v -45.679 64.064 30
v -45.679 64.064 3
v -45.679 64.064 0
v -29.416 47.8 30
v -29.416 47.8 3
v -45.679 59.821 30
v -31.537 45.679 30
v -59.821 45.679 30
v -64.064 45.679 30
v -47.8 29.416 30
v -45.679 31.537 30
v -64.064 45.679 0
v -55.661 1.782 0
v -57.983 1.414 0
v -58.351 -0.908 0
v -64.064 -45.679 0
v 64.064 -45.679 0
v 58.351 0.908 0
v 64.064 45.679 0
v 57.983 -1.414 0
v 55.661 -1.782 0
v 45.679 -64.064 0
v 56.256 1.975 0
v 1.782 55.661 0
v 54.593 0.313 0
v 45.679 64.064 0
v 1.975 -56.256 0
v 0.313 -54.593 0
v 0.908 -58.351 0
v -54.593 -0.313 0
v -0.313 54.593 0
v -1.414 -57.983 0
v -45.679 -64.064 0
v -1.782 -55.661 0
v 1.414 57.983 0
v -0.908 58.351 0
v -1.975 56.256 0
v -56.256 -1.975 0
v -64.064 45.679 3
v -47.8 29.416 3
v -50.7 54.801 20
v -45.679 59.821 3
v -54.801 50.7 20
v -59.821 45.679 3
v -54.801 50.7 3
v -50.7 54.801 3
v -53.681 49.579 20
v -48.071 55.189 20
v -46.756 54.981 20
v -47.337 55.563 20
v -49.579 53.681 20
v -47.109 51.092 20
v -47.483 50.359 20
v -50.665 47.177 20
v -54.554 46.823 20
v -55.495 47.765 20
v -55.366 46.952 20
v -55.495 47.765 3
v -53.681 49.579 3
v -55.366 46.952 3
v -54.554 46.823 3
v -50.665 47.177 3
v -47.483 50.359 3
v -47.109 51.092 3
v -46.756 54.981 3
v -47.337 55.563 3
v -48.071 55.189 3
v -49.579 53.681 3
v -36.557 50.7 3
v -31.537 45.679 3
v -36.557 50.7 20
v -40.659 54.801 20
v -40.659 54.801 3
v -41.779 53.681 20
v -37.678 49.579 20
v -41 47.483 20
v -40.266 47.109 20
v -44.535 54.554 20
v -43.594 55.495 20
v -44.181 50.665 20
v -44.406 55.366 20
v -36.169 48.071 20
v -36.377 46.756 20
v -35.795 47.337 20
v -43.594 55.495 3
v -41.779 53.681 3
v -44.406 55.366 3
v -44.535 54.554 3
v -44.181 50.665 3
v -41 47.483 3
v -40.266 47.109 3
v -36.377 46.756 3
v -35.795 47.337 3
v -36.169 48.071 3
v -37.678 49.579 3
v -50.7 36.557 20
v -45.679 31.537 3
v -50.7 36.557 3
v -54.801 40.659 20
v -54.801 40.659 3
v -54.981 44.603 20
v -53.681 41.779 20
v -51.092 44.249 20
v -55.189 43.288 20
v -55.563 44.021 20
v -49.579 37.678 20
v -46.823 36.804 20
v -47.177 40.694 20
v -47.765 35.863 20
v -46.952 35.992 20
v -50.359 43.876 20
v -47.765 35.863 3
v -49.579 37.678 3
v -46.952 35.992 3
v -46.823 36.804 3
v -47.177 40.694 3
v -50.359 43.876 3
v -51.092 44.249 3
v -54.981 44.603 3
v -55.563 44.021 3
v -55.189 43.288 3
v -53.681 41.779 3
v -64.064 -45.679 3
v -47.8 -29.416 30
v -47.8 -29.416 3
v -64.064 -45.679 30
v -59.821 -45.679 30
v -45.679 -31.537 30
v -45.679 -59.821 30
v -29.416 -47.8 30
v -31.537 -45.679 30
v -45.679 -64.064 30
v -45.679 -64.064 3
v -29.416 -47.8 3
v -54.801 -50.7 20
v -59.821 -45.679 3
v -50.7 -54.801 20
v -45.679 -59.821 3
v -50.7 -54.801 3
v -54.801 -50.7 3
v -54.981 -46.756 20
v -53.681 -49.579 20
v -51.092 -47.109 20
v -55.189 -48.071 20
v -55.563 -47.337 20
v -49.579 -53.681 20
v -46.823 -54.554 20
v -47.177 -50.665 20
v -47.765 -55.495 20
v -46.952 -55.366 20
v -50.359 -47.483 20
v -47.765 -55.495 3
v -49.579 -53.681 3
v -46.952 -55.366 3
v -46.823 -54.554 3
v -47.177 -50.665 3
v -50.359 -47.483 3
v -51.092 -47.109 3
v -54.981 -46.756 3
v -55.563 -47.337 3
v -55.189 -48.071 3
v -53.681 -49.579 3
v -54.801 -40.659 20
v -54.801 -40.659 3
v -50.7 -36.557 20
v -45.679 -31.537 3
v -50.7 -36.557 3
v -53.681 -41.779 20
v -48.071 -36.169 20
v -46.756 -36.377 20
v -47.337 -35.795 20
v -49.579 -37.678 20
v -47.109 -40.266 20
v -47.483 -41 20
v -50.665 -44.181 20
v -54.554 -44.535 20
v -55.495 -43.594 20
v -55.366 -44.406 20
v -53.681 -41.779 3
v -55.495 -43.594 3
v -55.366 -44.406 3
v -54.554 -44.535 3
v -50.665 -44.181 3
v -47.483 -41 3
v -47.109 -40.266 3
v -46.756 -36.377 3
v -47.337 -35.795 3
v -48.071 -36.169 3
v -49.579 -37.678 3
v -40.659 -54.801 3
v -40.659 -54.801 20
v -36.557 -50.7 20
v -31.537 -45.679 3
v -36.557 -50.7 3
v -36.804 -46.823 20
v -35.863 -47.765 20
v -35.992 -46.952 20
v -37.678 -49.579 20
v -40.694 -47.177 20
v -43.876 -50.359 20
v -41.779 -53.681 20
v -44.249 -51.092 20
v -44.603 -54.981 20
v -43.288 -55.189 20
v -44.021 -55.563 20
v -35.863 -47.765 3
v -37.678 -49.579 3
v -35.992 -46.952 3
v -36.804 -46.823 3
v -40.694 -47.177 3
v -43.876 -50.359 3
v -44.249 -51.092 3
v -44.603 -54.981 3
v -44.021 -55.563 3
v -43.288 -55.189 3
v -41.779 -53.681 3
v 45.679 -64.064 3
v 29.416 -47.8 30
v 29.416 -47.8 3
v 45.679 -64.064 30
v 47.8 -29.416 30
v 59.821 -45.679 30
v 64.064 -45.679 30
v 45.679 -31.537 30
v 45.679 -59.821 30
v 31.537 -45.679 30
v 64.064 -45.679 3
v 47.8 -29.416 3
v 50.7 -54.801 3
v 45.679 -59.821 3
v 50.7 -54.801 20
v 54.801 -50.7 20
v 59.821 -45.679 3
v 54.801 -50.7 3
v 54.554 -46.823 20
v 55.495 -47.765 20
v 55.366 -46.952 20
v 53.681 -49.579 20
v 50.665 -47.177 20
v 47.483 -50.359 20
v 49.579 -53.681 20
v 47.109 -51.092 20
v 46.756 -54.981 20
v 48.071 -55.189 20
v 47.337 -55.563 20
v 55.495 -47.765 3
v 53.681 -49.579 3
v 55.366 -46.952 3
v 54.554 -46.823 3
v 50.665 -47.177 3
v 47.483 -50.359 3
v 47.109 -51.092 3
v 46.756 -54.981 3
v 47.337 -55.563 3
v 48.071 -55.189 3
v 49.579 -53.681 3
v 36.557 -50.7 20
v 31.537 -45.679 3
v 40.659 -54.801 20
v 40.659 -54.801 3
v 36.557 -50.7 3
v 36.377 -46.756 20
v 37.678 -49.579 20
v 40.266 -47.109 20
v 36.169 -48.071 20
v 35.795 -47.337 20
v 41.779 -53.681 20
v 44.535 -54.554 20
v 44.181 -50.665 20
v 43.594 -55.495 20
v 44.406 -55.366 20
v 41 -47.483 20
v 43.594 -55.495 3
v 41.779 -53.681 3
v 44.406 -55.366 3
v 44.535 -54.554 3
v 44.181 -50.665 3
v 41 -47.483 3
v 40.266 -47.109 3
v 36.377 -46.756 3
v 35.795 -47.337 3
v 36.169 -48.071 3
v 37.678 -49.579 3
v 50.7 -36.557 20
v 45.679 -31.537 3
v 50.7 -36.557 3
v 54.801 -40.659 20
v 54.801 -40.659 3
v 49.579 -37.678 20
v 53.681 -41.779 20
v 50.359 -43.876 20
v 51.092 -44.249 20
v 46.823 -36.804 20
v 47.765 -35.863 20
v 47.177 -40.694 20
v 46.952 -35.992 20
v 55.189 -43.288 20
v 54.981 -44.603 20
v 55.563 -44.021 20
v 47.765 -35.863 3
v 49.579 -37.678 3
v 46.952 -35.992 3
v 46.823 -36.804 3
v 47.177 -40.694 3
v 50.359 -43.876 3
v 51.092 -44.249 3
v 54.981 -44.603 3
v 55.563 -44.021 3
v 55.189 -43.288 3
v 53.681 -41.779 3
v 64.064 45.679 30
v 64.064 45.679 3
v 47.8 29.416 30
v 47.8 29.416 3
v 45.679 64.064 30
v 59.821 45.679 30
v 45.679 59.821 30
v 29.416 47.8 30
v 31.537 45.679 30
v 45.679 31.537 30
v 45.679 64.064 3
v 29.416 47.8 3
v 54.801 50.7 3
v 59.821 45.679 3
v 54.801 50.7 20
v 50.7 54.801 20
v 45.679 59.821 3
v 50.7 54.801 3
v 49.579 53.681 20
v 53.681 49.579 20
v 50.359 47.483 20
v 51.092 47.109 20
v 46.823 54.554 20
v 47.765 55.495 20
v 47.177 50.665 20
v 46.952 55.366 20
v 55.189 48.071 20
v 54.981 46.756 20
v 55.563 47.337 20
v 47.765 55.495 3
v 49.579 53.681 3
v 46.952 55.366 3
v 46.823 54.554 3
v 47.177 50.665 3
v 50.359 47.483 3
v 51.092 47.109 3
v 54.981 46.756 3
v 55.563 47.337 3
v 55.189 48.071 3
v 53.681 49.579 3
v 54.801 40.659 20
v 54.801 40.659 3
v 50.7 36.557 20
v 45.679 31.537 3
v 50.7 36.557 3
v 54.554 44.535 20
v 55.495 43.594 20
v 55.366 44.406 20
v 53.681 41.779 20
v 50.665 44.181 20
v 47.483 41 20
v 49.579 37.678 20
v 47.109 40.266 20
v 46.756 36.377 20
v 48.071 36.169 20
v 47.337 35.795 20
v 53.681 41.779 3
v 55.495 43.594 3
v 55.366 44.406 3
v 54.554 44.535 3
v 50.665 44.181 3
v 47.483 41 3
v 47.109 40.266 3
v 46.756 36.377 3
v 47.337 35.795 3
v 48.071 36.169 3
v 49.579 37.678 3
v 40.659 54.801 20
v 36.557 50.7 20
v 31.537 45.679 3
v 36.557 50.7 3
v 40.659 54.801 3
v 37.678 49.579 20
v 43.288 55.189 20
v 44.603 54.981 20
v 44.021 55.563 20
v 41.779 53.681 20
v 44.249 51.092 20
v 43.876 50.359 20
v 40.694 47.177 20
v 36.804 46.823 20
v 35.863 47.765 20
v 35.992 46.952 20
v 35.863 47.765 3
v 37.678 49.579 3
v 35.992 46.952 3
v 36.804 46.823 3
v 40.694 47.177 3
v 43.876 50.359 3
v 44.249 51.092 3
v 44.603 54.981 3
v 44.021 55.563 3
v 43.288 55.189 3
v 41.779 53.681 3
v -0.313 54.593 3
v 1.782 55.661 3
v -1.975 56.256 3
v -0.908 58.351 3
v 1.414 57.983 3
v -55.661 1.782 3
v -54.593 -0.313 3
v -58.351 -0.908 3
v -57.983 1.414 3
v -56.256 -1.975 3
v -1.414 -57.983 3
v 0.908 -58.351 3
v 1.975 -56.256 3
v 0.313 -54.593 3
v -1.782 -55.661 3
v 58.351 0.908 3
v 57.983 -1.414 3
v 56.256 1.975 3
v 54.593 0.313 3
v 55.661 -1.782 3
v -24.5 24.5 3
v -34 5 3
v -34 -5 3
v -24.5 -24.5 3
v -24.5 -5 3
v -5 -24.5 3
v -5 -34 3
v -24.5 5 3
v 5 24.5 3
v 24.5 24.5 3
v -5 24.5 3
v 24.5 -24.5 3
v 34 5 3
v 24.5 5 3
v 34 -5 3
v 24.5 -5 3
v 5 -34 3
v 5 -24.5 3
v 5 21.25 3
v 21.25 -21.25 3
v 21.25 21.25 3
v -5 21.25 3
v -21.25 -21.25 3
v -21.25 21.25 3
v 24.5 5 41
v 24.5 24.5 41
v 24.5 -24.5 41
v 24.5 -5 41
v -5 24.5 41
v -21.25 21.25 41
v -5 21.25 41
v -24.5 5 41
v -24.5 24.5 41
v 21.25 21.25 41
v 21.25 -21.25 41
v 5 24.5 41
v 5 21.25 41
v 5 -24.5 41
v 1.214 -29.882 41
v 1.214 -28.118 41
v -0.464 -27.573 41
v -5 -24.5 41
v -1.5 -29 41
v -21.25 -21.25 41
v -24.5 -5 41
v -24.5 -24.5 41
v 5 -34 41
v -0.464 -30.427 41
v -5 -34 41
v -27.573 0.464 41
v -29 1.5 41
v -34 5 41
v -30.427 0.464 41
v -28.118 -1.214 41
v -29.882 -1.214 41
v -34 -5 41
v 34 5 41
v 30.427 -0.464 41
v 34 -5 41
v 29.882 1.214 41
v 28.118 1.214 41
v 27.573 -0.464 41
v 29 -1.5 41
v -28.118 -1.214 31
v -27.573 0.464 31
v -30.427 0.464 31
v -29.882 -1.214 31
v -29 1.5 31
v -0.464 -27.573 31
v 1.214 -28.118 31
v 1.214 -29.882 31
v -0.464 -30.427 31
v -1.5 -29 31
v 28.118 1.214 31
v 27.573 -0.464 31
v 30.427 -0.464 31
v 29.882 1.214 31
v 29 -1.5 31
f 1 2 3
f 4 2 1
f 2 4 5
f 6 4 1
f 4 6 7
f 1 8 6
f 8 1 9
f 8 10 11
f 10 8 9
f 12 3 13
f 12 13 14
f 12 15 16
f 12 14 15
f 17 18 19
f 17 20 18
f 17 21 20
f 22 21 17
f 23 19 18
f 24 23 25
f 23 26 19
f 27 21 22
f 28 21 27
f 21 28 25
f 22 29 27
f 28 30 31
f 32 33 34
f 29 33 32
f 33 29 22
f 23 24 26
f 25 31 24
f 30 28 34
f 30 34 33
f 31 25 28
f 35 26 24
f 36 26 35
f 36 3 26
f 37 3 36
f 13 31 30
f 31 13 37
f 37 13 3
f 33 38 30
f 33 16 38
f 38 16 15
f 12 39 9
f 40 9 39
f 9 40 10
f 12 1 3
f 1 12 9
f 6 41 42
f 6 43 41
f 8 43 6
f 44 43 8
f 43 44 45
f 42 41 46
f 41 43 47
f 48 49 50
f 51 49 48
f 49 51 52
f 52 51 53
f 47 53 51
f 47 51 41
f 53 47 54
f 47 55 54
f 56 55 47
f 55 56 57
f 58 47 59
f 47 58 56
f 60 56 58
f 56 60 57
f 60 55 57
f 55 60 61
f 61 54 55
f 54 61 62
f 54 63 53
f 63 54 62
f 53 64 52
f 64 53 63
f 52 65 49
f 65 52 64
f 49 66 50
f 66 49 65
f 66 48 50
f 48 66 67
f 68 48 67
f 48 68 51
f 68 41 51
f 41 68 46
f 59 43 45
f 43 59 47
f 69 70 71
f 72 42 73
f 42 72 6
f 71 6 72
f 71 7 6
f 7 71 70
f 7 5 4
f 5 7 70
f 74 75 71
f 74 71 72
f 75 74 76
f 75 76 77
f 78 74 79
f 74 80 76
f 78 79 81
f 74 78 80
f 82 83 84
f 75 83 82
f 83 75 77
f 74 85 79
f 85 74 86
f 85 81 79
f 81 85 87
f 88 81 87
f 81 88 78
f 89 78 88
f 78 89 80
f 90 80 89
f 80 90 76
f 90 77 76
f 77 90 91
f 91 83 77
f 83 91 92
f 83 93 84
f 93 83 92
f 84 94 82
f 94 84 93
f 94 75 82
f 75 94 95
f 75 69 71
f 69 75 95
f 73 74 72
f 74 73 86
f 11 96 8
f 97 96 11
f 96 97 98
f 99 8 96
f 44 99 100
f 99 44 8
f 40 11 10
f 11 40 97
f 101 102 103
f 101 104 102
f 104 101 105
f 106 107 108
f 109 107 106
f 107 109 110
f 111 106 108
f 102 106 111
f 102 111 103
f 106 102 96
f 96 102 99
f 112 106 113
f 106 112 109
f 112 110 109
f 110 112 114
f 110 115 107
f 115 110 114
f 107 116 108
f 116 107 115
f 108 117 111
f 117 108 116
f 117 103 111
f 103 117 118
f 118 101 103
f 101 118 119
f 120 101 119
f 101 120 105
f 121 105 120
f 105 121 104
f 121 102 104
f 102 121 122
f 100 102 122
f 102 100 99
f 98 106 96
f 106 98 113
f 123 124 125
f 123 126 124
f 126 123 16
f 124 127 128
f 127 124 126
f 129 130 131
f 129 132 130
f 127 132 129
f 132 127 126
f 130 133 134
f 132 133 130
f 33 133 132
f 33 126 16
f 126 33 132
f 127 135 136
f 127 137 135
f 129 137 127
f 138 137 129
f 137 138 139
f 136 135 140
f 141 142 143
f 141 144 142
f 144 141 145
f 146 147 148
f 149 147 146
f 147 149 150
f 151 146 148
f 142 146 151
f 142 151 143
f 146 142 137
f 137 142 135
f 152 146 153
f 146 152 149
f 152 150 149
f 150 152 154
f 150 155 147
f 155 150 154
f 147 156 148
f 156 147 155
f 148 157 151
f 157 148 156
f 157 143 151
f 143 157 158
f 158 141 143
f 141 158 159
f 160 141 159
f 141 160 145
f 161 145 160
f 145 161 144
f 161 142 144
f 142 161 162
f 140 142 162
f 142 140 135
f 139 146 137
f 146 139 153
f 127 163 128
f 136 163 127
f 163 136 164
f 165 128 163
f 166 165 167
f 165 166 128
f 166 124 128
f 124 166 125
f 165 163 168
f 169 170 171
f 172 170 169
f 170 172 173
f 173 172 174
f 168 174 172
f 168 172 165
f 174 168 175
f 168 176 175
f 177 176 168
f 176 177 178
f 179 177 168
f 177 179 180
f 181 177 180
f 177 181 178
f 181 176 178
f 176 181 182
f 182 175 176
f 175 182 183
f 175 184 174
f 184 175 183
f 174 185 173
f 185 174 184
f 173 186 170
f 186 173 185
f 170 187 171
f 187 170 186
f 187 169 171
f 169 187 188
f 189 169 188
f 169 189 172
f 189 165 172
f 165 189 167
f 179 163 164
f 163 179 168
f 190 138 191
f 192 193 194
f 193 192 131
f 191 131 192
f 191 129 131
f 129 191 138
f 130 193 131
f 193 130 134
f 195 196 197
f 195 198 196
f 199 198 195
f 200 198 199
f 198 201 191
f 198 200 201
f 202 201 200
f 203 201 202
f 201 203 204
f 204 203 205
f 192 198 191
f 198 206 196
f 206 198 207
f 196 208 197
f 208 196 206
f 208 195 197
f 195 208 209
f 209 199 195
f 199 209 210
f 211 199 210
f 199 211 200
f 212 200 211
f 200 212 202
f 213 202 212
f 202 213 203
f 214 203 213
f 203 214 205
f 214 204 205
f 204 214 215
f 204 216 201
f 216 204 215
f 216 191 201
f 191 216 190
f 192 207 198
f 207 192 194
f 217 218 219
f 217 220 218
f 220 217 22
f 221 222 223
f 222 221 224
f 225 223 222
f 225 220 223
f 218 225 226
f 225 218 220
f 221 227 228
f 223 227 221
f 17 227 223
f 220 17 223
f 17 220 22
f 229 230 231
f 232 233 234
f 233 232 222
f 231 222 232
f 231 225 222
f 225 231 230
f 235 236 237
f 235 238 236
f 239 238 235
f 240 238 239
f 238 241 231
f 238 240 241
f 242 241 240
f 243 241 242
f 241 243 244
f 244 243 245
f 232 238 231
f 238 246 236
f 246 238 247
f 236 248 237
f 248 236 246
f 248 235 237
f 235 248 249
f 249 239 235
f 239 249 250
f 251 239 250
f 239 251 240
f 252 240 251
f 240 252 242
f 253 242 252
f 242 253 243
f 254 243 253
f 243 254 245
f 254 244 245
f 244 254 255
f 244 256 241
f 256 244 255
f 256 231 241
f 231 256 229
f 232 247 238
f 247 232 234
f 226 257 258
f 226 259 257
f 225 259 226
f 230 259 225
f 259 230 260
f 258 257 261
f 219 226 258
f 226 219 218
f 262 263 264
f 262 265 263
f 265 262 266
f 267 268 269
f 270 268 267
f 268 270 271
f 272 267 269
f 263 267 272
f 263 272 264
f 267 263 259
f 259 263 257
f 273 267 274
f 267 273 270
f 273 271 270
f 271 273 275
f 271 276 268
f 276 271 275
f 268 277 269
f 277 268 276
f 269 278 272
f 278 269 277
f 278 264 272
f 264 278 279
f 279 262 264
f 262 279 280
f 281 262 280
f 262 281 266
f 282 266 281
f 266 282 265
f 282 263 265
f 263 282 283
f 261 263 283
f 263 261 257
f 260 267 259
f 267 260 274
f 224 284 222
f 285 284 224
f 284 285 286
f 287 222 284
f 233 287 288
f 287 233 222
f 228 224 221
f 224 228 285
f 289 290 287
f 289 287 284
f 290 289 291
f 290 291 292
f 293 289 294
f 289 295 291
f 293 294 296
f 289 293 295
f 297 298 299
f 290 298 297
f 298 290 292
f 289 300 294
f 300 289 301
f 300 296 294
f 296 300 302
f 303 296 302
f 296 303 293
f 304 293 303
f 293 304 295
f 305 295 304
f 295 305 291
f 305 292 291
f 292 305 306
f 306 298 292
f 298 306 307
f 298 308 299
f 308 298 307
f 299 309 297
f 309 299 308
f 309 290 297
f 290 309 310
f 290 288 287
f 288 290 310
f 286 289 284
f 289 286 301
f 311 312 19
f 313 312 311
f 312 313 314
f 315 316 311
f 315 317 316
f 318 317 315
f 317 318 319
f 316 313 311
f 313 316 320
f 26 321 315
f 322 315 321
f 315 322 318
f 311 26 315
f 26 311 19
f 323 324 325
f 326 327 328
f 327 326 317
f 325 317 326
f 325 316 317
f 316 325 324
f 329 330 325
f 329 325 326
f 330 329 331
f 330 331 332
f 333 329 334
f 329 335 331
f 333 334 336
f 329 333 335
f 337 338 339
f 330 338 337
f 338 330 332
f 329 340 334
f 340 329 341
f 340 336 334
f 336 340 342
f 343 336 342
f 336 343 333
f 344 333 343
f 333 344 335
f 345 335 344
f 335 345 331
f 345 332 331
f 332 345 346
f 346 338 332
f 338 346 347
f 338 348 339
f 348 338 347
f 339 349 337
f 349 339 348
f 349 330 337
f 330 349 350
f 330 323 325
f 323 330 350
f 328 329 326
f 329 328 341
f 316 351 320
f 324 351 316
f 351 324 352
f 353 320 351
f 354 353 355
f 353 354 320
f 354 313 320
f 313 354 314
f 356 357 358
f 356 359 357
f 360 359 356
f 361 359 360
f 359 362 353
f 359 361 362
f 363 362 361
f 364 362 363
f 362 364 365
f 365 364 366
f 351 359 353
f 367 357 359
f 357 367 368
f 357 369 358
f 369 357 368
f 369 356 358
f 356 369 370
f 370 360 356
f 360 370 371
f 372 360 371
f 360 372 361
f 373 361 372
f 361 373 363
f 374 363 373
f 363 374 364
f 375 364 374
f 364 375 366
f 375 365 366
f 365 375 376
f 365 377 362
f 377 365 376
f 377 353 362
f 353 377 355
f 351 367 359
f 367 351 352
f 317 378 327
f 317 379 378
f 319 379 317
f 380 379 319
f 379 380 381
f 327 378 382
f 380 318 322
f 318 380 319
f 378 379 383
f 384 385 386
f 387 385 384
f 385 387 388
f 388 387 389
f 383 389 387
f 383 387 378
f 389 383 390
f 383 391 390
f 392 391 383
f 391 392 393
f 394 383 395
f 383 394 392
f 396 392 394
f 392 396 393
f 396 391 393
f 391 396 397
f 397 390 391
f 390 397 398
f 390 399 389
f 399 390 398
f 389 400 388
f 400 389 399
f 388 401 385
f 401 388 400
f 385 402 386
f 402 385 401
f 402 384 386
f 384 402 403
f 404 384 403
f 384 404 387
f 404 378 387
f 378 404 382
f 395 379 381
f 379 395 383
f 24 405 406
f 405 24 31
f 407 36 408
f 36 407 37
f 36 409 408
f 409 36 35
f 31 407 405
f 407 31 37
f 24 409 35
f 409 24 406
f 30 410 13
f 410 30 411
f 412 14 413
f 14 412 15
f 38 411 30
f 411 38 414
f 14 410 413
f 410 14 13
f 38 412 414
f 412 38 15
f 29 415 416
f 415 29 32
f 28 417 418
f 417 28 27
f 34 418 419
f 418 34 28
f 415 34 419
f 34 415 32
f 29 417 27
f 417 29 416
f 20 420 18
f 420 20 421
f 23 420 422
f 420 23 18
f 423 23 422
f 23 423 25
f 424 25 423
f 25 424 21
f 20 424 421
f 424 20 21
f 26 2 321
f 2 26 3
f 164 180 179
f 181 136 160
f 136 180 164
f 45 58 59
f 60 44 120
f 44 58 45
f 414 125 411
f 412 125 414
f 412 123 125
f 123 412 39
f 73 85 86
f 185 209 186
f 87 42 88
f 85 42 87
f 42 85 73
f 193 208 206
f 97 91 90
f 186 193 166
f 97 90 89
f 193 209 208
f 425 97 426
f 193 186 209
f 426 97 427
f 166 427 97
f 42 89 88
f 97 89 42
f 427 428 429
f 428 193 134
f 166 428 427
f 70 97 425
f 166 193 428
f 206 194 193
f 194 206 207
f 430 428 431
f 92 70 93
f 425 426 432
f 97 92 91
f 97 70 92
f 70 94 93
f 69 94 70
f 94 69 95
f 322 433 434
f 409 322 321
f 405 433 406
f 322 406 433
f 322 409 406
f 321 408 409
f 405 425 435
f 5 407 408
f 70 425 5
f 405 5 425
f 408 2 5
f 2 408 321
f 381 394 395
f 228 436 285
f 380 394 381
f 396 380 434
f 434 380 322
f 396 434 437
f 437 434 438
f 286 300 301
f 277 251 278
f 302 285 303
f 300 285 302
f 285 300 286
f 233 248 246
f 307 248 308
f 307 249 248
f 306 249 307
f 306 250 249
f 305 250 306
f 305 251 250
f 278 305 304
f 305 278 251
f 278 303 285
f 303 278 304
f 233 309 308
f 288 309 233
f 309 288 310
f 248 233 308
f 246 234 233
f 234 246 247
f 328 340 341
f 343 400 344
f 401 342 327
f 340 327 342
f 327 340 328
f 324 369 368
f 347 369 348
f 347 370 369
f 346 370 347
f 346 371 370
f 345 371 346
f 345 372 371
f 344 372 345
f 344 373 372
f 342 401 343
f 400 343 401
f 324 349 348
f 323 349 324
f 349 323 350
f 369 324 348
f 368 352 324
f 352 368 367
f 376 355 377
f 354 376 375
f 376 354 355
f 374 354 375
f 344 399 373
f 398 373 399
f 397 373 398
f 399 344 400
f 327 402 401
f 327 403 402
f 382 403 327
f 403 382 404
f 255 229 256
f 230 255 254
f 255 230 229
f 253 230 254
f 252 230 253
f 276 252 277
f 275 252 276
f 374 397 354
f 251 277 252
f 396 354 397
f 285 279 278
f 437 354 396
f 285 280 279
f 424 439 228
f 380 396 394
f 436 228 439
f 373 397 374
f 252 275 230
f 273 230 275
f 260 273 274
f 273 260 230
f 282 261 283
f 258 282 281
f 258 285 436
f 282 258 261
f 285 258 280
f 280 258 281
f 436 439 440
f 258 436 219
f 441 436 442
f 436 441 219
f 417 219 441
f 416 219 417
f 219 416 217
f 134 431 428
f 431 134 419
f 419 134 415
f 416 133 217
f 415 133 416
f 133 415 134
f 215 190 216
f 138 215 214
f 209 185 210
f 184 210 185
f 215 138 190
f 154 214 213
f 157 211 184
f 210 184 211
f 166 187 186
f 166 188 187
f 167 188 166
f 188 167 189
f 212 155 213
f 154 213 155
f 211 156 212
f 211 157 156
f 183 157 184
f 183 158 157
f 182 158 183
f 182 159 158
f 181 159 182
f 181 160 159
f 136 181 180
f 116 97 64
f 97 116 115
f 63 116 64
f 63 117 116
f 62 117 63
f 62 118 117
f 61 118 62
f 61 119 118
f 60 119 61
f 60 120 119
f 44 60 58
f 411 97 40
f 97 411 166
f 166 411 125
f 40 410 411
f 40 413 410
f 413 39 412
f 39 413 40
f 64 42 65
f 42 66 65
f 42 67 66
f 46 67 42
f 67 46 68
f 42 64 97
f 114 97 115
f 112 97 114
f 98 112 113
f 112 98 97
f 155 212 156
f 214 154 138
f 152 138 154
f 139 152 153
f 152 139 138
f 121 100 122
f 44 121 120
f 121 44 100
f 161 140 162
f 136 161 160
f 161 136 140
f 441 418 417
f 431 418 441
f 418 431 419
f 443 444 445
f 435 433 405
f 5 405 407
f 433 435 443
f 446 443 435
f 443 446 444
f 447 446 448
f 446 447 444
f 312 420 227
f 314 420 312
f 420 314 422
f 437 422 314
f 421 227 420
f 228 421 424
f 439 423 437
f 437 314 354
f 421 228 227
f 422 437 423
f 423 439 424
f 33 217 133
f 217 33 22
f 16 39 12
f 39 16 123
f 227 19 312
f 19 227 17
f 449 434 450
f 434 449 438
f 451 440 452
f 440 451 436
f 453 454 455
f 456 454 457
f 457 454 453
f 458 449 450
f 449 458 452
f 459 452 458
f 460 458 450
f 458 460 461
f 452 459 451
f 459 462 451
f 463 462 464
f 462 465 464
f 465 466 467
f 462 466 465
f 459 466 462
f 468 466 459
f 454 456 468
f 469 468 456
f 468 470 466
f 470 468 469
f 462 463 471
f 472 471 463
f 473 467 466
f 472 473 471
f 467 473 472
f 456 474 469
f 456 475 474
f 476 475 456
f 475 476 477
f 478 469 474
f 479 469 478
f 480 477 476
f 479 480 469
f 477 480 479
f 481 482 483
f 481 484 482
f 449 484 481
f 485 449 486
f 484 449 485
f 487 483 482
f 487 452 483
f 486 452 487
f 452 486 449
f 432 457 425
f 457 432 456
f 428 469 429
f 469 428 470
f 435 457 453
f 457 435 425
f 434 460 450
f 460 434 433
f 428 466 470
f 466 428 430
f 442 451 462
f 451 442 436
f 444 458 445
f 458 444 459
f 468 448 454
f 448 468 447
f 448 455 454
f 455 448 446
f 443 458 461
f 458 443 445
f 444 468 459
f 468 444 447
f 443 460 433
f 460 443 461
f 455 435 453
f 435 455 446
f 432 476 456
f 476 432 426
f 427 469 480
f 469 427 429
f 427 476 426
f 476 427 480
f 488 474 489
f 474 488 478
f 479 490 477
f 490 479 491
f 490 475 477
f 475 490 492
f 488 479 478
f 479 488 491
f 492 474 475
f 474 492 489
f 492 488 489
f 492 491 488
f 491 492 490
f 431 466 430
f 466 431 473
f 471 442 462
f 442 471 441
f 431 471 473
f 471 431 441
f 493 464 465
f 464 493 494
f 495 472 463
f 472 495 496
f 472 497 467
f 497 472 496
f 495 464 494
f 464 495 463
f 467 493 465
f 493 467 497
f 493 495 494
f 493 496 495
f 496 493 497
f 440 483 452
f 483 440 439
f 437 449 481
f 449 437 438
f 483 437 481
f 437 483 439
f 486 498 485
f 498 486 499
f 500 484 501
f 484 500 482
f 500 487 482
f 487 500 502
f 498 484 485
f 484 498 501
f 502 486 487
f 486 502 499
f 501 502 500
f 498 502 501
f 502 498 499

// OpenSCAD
largeurSupport = 26;
taillePlatine = 155.2;
hauteurSupport = 30;
$fn = 5;

rotate(45) union() {
	for (i = [0 : 3]) {
		rotate([0, 0, i * 90]) {
			translate([0, 54.6,0]) support();
		}
	}
	difference() {
		platine();
		for (i = [0 : 3]) {
			rotate([0, 0, i * 90]) translate([40, 40,0]) trouDeVis();
		}
	}
	supportMoteur();
}

module support() {
	union() {
		translate([-13, 20, 0]) cube([26, 3, hauteurSupport]);
		translate([0, 20, 0]) rotate(180) fleche();
		translate([10, 0, 0]) cube([3, 23, hauteurSupport]);
		translate([10, 10, 0]) rotate(90) fleche();
		translate([-13, 0, 0]) cube([3, 23, hauteurSupport]);
		translate([-10, 10, 0]) rotate(-90) fleche();
	}
}

module platine() {
	linear_extrude(height = 3, center = false, convexity = 10, twist = 0)
	polygon([	[-taillePlatine / 2, largeurSupport / 2], [-largeurSupport / 2, taillePlatine / 2],
				[largeurSupport / 2, taillePlatine / 2], [taillePlatine / 2, largeurSupport / 2],
				[taillePlatine / 2, -largeurSupport / 2], [largeurSupport / 2, -taillePlatine / 2],
				[-largeurSupport / 2, -taillePlatine / 2], [-taillePlatine / 2, -largeurSupport / 2]
	]);
}

module fleche() {
	linear_extrude(height = 20, center = false, convexity = 10, twist = 0)
	union() {
		translate([-2.9, 0, 0]) square([5.8, 5]);
		hull() {
			translate([5.25, 2.25, 0]) circle(0.7, true);
			translate([-5.25, 2.25, 0]) circle(0.7, true);
			translate([-2.25, 4.75, 0]) circle(0.7, true);
			translate([2.25, 4.75, 0]) circle(0.7, true);
		}
	}
}

module trouDeVis() {
	cylinder(h = 20, r = 2, center = true);
}

module supportMoteur() {
	rotate(-45) union() {
		difference() {
			translate([-24.5, -24.5, 0]) cube([49, 49, 41]);
			translate([-21.25, -21.25, -10]) cube([42.5, 42.5, 60]);
			translate([-5, 20, -10])cube([10, 10, 60]);
		}
		for (i = [1 : 3]) {
			rotate([0, 0, i * 90]) translate([-5, 24, 0]) {
				difference() {
					cube([10, 10, 41]);
					translate([5, 5, 41]) cylinder(h = 20, r = 1.5, center = true); 
				}
			}
		}
		
	}
}
